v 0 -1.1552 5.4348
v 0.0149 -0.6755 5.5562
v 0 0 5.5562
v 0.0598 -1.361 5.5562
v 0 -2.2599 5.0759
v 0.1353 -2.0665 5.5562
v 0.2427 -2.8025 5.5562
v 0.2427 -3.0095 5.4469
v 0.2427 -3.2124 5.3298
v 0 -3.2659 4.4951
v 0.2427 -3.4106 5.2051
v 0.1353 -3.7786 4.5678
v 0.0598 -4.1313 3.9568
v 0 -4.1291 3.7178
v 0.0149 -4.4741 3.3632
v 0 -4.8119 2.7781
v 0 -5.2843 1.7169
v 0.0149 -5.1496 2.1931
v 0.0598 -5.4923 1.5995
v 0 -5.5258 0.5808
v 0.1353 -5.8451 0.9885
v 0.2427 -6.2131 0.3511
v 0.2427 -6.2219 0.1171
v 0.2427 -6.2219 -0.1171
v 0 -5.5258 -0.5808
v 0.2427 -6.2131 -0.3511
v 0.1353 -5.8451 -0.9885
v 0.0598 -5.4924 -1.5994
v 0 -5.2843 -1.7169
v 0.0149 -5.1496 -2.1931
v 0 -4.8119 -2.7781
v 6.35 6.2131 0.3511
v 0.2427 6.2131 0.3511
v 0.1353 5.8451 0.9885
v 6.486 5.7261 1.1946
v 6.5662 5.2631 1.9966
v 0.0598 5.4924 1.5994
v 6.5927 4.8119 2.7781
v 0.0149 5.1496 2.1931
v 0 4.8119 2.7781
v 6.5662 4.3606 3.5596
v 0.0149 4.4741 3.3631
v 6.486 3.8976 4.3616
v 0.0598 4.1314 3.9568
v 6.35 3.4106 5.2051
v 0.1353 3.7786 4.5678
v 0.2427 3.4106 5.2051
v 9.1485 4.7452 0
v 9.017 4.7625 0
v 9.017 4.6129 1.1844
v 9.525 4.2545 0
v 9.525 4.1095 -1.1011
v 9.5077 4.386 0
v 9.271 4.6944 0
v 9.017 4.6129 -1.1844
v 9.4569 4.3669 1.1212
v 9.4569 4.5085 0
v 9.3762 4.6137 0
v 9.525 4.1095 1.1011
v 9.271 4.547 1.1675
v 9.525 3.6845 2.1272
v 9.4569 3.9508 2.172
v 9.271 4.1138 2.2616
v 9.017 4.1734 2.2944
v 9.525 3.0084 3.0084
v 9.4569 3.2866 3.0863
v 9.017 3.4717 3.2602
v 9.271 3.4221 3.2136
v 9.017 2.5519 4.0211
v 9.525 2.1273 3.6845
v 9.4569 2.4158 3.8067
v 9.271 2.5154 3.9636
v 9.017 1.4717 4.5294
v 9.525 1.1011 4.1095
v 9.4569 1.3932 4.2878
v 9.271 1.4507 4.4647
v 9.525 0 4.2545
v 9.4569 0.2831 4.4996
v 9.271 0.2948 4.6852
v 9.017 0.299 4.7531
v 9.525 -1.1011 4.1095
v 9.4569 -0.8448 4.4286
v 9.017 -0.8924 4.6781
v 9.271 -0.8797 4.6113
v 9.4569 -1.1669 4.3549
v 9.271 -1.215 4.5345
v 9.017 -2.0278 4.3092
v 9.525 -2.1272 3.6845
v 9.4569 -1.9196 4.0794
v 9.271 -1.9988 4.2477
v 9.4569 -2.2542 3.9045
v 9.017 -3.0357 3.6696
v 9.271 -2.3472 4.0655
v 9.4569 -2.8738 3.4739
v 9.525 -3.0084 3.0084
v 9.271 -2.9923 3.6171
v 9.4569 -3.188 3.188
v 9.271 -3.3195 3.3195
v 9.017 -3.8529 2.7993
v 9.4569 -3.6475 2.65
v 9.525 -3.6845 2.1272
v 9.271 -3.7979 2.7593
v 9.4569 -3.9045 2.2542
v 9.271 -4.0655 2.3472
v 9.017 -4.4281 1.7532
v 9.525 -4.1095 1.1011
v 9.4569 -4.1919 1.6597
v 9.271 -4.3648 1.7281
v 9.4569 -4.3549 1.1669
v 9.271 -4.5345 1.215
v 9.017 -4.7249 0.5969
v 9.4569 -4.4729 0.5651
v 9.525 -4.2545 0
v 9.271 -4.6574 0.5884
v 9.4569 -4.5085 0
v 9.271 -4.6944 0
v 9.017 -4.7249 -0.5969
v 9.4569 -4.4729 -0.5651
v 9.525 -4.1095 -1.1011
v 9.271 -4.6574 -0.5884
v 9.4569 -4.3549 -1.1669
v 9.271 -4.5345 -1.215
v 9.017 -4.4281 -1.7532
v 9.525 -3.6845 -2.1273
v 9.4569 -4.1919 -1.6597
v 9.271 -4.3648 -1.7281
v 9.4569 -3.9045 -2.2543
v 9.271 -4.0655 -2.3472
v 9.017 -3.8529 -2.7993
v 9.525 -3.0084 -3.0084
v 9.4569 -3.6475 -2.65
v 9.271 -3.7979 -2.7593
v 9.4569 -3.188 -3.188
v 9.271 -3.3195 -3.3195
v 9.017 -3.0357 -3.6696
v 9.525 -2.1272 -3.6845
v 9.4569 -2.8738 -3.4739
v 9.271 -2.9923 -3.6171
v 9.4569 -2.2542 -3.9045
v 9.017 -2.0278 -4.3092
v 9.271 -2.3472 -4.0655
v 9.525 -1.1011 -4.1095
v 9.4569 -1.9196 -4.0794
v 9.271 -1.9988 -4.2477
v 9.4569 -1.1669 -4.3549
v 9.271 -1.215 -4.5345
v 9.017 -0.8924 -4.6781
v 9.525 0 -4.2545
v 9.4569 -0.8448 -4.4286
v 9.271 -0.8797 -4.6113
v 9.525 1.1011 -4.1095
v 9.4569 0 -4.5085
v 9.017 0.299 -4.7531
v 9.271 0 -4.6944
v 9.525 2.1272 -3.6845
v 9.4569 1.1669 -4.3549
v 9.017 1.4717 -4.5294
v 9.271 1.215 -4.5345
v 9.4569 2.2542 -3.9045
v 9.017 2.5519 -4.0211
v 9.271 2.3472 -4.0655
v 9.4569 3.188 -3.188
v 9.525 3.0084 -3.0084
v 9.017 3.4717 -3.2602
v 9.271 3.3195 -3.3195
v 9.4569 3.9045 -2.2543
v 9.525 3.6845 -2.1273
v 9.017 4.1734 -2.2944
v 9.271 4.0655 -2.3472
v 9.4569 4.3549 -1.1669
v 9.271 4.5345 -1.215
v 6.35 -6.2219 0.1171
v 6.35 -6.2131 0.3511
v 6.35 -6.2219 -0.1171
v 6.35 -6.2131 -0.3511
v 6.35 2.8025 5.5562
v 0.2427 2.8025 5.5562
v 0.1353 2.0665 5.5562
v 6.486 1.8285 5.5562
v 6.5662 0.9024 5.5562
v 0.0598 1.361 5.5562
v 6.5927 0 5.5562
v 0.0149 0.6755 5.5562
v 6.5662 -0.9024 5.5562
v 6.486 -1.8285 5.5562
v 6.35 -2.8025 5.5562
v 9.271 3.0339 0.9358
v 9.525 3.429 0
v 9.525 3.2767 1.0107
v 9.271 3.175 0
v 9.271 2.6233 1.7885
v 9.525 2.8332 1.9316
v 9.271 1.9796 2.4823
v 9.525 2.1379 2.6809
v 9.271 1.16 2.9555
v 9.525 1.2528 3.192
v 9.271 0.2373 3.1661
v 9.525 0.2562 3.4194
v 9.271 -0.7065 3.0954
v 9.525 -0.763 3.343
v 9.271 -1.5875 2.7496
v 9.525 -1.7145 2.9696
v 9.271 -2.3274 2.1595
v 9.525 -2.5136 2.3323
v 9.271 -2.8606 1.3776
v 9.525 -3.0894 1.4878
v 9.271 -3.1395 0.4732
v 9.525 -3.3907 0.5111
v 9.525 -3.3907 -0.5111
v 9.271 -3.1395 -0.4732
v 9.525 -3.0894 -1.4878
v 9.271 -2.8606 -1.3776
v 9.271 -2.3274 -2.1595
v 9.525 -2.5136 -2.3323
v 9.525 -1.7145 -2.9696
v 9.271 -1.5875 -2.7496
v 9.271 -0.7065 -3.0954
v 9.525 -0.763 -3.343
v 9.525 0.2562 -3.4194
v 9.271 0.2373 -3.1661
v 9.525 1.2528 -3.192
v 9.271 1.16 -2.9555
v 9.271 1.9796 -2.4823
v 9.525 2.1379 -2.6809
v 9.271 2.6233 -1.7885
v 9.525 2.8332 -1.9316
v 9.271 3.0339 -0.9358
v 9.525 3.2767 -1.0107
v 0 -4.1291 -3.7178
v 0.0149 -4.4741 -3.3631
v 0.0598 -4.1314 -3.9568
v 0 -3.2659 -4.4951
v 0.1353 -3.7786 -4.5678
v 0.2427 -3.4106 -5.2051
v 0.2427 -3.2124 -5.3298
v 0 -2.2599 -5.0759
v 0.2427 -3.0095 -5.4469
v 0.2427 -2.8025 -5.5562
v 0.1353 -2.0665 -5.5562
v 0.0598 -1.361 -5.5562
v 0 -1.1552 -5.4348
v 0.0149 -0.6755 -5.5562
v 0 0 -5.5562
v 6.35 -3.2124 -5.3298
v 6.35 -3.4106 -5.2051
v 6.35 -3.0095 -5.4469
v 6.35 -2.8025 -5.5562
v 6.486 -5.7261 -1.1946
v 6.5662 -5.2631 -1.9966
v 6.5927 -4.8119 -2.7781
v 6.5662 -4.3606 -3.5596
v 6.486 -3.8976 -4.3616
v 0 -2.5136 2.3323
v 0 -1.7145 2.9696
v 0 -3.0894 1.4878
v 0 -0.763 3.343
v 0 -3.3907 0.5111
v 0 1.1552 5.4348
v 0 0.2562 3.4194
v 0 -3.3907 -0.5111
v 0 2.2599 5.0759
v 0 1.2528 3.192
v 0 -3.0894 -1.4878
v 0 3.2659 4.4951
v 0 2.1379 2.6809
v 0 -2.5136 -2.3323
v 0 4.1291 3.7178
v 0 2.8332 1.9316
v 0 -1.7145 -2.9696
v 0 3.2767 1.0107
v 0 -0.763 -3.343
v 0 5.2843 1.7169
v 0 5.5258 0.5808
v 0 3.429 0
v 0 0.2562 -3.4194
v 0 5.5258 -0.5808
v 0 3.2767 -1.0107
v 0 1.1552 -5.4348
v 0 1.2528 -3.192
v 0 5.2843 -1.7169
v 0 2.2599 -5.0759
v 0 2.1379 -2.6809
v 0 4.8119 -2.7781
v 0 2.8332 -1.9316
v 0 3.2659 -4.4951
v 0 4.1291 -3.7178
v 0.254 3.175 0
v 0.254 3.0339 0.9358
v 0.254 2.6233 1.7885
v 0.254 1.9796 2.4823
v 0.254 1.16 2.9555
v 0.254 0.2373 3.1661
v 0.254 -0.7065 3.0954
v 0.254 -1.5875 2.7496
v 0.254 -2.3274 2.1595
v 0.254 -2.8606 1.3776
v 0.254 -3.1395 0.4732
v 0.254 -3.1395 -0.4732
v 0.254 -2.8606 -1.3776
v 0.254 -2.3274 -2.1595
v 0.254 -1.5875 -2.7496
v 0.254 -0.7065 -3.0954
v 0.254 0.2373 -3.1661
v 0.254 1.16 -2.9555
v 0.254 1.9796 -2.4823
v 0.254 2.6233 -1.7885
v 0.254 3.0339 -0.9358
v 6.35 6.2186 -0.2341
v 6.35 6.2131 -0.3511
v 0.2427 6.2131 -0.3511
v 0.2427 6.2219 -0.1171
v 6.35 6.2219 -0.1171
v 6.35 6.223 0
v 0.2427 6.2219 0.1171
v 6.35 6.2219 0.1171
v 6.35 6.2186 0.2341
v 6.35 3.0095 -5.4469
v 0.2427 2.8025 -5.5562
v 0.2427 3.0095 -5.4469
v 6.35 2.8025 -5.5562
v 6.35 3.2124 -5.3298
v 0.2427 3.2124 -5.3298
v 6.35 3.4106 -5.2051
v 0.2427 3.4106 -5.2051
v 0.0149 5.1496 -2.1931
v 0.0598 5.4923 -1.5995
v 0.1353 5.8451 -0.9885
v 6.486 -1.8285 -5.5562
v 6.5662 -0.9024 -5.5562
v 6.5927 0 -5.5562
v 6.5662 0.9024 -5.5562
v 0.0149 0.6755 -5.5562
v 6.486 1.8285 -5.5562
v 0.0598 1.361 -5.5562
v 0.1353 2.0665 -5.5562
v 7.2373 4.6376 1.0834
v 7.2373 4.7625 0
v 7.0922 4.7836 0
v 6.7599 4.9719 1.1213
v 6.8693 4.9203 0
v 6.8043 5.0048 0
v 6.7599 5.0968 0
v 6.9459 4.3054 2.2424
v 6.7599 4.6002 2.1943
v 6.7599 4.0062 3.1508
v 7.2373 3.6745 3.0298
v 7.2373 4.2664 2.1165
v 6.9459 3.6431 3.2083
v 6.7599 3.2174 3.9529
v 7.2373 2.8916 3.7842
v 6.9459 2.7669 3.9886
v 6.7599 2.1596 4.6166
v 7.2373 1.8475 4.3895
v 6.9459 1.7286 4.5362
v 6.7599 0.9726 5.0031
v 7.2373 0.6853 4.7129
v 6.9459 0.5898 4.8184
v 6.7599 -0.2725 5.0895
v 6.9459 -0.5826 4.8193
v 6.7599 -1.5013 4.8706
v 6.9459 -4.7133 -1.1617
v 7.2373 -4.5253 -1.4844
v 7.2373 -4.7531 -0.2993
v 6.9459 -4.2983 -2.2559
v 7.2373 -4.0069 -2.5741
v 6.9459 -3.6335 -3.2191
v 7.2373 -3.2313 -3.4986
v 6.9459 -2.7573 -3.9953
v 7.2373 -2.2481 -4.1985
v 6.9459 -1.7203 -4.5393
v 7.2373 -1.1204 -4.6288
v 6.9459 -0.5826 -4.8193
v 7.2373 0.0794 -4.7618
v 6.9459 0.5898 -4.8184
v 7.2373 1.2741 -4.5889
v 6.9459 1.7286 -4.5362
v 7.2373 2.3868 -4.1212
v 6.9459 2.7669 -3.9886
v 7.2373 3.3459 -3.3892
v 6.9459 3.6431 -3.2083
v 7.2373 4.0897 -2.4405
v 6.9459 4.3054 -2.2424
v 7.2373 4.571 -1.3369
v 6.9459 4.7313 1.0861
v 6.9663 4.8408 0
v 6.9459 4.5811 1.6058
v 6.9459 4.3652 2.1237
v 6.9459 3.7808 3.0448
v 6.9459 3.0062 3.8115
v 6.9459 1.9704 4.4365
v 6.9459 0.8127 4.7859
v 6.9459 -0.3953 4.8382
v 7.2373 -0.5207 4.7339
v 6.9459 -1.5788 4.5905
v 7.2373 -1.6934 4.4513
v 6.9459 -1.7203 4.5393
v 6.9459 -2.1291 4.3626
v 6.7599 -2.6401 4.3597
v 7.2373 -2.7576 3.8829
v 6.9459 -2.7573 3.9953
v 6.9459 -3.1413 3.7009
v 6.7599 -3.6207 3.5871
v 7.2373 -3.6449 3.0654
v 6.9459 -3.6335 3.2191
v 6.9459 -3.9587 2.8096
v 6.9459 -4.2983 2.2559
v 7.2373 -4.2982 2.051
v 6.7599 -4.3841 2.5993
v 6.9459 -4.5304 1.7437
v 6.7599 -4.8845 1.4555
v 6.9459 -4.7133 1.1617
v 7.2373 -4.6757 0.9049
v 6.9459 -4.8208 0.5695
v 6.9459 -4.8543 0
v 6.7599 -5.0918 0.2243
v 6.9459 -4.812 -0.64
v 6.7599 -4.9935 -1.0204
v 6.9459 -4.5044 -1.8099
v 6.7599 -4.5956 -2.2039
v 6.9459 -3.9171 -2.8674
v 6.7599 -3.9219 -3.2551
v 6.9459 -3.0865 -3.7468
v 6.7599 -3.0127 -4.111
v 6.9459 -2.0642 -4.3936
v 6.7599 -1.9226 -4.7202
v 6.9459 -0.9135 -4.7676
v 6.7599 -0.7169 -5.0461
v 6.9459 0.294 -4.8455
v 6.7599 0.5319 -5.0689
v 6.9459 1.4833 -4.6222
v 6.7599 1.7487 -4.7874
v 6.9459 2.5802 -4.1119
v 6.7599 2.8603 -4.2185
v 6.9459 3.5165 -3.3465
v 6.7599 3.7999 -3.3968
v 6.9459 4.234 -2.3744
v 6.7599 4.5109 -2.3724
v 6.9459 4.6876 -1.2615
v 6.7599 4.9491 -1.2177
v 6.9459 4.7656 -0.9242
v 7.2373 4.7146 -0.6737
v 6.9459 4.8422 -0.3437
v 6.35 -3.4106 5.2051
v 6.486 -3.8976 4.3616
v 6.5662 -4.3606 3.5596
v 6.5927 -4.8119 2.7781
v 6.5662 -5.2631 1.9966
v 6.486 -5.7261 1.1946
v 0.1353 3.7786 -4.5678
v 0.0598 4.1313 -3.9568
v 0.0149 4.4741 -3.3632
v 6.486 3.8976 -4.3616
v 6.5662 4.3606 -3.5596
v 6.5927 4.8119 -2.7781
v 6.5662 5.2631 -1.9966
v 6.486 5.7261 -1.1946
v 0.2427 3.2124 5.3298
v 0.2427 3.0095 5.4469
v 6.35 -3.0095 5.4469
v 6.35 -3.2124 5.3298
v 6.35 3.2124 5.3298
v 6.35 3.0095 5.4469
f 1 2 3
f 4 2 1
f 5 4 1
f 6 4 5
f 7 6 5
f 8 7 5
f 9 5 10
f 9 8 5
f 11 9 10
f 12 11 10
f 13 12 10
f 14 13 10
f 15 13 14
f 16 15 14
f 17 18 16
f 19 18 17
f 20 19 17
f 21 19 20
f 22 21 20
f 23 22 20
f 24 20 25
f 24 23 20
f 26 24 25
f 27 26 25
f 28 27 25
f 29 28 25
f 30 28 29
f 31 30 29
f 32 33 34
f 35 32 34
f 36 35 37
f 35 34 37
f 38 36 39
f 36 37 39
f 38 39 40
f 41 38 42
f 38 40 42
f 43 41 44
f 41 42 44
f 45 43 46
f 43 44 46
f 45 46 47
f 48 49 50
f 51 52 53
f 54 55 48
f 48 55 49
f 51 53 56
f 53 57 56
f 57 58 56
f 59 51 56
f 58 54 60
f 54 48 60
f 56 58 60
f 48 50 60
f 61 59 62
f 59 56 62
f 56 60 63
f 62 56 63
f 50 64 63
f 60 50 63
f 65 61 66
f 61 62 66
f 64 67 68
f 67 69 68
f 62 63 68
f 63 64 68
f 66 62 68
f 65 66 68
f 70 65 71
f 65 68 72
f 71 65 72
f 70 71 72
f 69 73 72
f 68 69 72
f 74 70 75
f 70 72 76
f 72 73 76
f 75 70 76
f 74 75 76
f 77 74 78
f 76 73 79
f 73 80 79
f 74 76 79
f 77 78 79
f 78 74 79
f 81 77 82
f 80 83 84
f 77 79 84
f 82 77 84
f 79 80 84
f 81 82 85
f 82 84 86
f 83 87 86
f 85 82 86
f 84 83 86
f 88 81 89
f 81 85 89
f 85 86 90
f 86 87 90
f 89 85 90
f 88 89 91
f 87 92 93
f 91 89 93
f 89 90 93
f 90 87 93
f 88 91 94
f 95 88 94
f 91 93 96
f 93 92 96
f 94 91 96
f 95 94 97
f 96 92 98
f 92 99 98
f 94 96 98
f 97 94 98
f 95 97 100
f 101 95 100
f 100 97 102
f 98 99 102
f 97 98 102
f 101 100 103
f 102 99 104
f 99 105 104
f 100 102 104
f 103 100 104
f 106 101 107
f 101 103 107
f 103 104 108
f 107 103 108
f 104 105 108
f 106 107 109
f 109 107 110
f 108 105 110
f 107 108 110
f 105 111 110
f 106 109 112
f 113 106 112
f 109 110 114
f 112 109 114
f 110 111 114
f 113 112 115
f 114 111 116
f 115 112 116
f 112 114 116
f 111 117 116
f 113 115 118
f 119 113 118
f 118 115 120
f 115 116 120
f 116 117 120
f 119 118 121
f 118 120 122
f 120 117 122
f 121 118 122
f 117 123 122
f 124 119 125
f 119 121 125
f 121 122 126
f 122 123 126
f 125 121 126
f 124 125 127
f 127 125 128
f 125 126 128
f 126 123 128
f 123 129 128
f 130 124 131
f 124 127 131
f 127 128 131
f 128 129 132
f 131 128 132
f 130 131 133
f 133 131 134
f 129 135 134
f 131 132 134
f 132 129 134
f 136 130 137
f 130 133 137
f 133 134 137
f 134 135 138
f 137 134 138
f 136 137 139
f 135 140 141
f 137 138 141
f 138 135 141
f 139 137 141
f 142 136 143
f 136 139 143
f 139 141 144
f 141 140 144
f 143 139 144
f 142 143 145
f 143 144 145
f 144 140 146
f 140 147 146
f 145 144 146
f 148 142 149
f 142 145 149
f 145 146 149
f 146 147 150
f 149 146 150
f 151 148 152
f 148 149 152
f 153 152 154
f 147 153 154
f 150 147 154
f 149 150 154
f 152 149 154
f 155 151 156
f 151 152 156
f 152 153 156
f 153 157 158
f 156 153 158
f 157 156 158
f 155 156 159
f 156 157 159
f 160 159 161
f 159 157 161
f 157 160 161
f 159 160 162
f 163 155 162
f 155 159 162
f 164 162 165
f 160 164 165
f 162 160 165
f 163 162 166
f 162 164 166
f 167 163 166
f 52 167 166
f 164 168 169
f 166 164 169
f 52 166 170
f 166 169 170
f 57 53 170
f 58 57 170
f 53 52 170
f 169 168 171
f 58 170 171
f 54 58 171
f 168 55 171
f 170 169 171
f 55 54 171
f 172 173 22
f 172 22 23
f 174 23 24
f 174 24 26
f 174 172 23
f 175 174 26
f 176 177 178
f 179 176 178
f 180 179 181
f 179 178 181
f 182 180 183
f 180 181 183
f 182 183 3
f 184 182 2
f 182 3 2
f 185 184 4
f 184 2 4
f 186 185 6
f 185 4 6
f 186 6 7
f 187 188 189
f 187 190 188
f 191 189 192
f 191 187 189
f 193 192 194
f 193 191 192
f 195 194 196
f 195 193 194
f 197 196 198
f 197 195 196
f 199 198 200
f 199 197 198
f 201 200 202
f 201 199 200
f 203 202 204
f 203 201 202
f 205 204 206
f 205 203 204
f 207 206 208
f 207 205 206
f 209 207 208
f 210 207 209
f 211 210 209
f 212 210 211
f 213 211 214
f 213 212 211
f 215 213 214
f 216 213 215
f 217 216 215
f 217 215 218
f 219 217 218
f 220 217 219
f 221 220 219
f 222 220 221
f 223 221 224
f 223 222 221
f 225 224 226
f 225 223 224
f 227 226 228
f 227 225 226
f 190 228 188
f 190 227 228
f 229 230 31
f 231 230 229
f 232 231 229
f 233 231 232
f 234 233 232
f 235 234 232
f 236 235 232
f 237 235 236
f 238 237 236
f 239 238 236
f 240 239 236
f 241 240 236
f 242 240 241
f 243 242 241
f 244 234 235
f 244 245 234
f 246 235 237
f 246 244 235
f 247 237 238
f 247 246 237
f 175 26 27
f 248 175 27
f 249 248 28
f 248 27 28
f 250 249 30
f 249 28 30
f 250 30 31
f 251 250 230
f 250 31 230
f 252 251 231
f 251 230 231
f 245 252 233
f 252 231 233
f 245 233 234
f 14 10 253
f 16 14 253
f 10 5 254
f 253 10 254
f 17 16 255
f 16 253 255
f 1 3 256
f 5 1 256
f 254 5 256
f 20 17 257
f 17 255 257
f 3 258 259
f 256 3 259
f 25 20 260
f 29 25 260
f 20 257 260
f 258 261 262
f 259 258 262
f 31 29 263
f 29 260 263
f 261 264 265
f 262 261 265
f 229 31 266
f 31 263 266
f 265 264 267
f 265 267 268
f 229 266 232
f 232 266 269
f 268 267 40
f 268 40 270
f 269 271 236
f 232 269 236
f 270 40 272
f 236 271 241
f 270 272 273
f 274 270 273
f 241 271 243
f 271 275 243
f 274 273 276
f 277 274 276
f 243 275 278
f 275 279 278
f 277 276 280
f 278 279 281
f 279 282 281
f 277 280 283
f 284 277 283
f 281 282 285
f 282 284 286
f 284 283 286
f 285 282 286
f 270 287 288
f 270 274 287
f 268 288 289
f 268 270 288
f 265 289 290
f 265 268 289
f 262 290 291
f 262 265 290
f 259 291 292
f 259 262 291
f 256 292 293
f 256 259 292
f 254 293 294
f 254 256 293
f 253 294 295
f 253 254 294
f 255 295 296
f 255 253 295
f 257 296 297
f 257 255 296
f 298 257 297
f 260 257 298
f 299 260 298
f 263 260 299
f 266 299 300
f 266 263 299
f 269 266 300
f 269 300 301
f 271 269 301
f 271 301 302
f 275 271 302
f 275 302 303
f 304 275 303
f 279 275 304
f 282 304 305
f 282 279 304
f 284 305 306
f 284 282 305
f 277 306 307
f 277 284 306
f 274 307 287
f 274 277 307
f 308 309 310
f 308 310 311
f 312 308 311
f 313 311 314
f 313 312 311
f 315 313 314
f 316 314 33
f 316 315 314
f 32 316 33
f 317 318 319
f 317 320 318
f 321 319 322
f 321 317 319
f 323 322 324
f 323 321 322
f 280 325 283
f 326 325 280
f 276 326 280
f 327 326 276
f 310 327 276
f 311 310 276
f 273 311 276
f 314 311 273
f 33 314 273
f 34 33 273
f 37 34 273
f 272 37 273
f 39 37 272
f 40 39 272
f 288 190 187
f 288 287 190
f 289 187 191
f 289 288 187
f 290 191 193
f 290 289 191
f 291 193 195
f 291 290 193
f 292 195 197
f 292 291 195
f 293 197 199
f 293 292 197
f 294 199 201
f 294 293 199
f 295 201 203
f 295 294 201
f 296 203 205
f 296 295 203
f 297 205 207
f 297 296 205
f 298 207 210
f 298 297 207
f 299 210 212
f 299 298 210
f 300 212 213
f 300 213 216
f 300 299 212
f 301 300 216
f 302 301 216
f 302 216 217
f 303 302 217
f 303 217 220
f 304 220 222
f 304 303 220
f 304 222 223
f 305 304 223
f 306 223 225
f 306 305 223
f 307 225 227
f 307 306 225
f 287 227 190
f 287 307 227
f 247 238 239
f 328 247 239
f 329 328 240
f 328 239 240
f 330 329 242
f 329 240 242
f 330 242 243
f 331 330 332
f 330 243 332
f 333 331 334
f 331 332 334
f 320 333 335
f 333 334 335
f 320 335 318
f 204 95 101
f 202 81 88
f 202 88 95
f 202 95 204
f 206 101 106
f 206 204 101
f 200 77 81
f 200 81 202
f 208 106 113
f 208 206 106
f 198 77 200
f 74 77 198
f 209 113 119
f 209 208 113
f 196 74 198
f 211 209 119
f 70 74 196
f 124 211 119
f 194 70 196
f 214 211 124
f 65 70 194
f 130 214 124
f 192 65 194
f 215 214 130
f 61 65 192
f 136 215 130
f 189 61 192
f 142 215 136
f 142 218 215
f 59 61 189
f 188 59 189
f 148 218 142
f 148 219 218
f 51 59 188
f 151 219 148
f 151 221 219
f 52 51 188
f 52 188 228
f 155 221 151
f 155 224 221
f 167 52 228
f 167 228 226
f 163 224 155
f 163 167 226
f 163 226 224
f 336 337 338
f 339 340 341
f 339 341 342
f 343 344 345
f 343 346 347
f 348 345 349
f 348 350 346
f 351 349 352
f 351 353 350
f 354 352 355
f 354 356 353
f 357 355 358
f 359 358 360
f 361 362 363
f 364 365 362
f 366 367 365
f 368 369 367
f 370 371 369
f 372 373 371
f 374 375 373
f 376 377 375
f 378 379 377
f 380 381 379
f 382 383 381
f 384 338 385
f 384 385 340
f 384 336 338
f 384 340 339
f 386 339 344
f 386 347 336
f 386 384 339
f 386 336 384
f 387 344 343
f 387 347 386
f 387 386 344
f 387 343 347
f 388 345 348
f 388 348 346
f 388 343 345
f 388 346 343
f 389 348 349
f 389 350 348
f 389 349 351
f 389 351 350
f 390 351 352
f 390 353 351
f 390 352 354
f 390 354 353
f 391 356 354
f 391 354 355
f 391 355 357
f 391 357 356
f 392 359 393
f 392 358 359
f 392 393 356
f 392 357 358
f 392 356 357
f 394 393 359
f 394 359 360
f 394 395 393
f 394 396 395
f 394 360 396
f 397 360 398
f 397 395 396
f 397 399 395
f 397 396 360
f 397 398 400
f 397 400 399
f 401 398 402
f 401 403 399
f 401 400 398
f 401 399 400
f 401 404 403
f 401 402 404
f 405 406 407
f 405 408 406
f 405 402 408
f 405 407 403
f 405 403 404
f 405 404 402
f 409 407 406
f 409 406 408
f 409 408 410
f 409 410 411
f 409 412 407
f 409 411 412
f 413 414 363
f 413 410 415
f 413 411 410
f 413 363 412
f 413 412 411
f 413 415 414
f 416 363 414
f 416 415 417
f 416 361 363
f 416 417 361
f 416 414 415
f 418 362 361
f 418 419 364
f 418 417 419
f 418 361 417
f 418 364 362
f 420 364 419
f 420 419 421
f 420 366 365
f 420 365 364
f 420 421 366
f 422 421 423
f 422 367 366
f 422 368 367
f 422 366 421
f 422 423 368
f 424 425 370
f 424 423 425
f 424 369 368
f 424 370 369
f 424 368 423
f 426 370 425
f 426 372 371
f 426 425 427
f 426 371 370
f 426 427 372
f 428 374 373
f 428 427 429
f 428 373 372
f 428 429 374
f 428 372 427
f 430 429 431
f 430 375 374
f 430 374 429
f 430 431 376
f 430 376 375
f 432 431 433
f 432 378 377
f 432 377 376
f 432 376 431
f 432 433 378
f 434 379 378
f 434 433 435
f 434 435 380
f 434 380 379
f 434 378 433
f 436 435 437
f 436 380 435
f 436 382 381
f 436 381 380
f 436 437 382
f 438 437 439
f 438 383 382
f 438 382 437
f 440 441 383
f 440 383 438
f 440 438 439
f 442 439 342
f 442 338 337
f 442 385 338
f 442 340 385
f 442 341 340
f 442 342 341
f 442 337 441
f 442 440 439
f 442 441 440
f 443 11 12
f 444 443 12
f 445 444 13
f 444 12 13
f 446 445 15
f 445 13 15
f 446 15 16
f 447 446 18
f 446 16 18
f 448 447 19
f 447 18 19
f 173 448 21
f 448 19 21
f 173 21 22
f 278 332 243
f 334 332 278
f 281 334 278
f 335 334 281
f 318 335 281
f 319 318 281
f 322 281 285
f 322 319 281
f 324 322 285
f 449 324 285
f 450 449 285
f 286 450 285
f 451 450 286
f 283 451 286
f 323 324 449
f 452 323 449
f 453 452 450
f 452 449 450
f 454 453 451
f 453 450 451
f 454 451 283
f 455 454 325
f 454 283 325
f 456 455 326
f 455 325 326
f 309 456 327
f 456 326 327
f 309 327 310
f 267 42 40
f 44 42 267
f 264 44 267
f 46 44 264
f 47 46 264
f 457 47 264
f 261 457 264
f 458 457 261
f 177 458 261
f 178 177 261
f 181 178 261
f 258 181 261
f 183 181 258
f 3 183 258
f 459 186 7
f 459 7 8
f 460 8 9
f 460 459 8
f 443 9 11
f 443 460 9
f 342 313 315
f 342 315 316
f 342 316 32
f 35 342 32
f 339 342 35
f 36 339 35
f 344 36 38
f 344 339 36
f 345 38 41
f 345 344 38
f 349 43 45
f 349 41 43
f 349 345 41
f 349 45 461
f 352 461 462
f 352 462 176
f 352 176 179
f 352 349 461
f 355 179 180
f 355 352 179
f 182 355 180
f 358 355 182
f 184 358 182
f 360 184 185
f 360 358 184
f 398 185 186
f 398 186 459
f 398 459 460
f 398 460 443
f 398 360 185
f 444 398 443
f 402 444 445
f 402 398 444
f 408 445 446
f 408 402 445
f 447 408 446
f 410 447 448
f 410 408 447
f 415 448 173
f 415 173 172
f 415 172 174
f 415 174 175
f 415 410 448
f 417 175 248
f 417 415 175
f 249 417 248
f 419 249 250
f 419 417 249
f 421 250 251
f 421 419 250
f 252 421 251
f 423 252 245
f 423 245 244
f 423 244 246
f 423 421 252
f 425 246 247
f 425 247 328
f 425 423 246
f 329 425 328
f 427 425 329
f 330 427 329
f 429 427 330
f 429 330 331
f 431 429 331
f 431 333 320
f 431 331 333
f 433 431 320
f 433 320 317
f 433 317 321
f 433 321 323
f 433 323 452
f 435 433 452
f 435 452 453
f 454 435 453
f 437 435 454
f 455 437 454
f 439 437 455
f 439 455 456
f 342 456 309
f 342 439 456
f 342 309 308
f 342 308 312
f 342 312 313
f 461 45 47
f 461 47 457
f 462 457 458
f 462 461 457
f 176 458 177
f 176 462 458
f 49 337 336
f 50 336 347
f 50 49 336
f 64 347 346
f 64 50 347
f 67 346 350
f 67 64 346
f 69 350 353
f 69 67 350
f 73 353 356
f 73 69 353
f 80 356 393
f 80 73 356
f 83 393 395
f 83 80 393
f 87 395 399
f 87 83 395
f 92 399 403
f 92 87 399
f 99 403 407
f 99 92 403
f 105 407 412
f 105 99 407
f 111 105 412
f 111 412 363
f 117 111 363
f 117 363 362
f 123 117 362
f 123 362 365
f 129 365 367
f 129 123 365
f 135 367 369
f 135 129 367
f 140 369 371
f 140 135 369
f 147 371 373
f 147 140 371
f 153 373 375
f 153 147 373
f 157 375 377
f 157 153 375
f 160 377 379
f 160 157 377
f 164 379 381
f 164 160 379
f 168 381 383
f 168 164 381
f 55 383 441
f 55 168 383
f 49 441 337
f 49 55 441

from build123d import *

# Parameters (mm, degrees)
BOSS_EXTRUDE1_DEPTH = 9.525
FILLET1_R           = 0.508


with BuildPart() as part:
    # Sketch1 → Boss-Extrude1 (new body)
    with BuildSketch(Plane(origin=(0, 0, 0), x_dir=(0, 0, -1), z_dir=(1, 0, 0))):
        Polygon((0, 6.415804866), (-5.55625, 3.207902433), (-5.55625, -3.207902433), (0, -6.415804866), (5.55625, -3.207902433), (5.55625, 3.207902433), align=None)
    extrude(amount=BOSS_EXTRUDE1_DEPTH)

    # Sketch2 → Cut-Revolve2 (revolve, cut)
    with BuildSketch(Plane.XY):
        Polygon((0, 0), (9.525, 0), (9.525, 3.429), (9.271, 3.175), (0.254, 3.175), (0, 3.429), align=None)
        Polygon((0, 5.55625), (0.242677154, 6.223), (6.35, 6.223), (6.881578527, 4.7625), (9.525, 4.7625), (9.525, 6.415804866), (0, 6.415804866), align=None)
    revolve(axis=Axis((0, 0, 0), (1, 0, 0)), mode=Mode.SUBTRACT)

    # Fillet1
    fillet1_edges = [part.edges().sort_by_distance(p)[0] for p in [
        (9.525, -4.7625, 0),
        (6.881578527, -4.7625, 0),
    ]]
    fillet(fillet1_edges, radius=FILLET1_R)


solid = part.part
